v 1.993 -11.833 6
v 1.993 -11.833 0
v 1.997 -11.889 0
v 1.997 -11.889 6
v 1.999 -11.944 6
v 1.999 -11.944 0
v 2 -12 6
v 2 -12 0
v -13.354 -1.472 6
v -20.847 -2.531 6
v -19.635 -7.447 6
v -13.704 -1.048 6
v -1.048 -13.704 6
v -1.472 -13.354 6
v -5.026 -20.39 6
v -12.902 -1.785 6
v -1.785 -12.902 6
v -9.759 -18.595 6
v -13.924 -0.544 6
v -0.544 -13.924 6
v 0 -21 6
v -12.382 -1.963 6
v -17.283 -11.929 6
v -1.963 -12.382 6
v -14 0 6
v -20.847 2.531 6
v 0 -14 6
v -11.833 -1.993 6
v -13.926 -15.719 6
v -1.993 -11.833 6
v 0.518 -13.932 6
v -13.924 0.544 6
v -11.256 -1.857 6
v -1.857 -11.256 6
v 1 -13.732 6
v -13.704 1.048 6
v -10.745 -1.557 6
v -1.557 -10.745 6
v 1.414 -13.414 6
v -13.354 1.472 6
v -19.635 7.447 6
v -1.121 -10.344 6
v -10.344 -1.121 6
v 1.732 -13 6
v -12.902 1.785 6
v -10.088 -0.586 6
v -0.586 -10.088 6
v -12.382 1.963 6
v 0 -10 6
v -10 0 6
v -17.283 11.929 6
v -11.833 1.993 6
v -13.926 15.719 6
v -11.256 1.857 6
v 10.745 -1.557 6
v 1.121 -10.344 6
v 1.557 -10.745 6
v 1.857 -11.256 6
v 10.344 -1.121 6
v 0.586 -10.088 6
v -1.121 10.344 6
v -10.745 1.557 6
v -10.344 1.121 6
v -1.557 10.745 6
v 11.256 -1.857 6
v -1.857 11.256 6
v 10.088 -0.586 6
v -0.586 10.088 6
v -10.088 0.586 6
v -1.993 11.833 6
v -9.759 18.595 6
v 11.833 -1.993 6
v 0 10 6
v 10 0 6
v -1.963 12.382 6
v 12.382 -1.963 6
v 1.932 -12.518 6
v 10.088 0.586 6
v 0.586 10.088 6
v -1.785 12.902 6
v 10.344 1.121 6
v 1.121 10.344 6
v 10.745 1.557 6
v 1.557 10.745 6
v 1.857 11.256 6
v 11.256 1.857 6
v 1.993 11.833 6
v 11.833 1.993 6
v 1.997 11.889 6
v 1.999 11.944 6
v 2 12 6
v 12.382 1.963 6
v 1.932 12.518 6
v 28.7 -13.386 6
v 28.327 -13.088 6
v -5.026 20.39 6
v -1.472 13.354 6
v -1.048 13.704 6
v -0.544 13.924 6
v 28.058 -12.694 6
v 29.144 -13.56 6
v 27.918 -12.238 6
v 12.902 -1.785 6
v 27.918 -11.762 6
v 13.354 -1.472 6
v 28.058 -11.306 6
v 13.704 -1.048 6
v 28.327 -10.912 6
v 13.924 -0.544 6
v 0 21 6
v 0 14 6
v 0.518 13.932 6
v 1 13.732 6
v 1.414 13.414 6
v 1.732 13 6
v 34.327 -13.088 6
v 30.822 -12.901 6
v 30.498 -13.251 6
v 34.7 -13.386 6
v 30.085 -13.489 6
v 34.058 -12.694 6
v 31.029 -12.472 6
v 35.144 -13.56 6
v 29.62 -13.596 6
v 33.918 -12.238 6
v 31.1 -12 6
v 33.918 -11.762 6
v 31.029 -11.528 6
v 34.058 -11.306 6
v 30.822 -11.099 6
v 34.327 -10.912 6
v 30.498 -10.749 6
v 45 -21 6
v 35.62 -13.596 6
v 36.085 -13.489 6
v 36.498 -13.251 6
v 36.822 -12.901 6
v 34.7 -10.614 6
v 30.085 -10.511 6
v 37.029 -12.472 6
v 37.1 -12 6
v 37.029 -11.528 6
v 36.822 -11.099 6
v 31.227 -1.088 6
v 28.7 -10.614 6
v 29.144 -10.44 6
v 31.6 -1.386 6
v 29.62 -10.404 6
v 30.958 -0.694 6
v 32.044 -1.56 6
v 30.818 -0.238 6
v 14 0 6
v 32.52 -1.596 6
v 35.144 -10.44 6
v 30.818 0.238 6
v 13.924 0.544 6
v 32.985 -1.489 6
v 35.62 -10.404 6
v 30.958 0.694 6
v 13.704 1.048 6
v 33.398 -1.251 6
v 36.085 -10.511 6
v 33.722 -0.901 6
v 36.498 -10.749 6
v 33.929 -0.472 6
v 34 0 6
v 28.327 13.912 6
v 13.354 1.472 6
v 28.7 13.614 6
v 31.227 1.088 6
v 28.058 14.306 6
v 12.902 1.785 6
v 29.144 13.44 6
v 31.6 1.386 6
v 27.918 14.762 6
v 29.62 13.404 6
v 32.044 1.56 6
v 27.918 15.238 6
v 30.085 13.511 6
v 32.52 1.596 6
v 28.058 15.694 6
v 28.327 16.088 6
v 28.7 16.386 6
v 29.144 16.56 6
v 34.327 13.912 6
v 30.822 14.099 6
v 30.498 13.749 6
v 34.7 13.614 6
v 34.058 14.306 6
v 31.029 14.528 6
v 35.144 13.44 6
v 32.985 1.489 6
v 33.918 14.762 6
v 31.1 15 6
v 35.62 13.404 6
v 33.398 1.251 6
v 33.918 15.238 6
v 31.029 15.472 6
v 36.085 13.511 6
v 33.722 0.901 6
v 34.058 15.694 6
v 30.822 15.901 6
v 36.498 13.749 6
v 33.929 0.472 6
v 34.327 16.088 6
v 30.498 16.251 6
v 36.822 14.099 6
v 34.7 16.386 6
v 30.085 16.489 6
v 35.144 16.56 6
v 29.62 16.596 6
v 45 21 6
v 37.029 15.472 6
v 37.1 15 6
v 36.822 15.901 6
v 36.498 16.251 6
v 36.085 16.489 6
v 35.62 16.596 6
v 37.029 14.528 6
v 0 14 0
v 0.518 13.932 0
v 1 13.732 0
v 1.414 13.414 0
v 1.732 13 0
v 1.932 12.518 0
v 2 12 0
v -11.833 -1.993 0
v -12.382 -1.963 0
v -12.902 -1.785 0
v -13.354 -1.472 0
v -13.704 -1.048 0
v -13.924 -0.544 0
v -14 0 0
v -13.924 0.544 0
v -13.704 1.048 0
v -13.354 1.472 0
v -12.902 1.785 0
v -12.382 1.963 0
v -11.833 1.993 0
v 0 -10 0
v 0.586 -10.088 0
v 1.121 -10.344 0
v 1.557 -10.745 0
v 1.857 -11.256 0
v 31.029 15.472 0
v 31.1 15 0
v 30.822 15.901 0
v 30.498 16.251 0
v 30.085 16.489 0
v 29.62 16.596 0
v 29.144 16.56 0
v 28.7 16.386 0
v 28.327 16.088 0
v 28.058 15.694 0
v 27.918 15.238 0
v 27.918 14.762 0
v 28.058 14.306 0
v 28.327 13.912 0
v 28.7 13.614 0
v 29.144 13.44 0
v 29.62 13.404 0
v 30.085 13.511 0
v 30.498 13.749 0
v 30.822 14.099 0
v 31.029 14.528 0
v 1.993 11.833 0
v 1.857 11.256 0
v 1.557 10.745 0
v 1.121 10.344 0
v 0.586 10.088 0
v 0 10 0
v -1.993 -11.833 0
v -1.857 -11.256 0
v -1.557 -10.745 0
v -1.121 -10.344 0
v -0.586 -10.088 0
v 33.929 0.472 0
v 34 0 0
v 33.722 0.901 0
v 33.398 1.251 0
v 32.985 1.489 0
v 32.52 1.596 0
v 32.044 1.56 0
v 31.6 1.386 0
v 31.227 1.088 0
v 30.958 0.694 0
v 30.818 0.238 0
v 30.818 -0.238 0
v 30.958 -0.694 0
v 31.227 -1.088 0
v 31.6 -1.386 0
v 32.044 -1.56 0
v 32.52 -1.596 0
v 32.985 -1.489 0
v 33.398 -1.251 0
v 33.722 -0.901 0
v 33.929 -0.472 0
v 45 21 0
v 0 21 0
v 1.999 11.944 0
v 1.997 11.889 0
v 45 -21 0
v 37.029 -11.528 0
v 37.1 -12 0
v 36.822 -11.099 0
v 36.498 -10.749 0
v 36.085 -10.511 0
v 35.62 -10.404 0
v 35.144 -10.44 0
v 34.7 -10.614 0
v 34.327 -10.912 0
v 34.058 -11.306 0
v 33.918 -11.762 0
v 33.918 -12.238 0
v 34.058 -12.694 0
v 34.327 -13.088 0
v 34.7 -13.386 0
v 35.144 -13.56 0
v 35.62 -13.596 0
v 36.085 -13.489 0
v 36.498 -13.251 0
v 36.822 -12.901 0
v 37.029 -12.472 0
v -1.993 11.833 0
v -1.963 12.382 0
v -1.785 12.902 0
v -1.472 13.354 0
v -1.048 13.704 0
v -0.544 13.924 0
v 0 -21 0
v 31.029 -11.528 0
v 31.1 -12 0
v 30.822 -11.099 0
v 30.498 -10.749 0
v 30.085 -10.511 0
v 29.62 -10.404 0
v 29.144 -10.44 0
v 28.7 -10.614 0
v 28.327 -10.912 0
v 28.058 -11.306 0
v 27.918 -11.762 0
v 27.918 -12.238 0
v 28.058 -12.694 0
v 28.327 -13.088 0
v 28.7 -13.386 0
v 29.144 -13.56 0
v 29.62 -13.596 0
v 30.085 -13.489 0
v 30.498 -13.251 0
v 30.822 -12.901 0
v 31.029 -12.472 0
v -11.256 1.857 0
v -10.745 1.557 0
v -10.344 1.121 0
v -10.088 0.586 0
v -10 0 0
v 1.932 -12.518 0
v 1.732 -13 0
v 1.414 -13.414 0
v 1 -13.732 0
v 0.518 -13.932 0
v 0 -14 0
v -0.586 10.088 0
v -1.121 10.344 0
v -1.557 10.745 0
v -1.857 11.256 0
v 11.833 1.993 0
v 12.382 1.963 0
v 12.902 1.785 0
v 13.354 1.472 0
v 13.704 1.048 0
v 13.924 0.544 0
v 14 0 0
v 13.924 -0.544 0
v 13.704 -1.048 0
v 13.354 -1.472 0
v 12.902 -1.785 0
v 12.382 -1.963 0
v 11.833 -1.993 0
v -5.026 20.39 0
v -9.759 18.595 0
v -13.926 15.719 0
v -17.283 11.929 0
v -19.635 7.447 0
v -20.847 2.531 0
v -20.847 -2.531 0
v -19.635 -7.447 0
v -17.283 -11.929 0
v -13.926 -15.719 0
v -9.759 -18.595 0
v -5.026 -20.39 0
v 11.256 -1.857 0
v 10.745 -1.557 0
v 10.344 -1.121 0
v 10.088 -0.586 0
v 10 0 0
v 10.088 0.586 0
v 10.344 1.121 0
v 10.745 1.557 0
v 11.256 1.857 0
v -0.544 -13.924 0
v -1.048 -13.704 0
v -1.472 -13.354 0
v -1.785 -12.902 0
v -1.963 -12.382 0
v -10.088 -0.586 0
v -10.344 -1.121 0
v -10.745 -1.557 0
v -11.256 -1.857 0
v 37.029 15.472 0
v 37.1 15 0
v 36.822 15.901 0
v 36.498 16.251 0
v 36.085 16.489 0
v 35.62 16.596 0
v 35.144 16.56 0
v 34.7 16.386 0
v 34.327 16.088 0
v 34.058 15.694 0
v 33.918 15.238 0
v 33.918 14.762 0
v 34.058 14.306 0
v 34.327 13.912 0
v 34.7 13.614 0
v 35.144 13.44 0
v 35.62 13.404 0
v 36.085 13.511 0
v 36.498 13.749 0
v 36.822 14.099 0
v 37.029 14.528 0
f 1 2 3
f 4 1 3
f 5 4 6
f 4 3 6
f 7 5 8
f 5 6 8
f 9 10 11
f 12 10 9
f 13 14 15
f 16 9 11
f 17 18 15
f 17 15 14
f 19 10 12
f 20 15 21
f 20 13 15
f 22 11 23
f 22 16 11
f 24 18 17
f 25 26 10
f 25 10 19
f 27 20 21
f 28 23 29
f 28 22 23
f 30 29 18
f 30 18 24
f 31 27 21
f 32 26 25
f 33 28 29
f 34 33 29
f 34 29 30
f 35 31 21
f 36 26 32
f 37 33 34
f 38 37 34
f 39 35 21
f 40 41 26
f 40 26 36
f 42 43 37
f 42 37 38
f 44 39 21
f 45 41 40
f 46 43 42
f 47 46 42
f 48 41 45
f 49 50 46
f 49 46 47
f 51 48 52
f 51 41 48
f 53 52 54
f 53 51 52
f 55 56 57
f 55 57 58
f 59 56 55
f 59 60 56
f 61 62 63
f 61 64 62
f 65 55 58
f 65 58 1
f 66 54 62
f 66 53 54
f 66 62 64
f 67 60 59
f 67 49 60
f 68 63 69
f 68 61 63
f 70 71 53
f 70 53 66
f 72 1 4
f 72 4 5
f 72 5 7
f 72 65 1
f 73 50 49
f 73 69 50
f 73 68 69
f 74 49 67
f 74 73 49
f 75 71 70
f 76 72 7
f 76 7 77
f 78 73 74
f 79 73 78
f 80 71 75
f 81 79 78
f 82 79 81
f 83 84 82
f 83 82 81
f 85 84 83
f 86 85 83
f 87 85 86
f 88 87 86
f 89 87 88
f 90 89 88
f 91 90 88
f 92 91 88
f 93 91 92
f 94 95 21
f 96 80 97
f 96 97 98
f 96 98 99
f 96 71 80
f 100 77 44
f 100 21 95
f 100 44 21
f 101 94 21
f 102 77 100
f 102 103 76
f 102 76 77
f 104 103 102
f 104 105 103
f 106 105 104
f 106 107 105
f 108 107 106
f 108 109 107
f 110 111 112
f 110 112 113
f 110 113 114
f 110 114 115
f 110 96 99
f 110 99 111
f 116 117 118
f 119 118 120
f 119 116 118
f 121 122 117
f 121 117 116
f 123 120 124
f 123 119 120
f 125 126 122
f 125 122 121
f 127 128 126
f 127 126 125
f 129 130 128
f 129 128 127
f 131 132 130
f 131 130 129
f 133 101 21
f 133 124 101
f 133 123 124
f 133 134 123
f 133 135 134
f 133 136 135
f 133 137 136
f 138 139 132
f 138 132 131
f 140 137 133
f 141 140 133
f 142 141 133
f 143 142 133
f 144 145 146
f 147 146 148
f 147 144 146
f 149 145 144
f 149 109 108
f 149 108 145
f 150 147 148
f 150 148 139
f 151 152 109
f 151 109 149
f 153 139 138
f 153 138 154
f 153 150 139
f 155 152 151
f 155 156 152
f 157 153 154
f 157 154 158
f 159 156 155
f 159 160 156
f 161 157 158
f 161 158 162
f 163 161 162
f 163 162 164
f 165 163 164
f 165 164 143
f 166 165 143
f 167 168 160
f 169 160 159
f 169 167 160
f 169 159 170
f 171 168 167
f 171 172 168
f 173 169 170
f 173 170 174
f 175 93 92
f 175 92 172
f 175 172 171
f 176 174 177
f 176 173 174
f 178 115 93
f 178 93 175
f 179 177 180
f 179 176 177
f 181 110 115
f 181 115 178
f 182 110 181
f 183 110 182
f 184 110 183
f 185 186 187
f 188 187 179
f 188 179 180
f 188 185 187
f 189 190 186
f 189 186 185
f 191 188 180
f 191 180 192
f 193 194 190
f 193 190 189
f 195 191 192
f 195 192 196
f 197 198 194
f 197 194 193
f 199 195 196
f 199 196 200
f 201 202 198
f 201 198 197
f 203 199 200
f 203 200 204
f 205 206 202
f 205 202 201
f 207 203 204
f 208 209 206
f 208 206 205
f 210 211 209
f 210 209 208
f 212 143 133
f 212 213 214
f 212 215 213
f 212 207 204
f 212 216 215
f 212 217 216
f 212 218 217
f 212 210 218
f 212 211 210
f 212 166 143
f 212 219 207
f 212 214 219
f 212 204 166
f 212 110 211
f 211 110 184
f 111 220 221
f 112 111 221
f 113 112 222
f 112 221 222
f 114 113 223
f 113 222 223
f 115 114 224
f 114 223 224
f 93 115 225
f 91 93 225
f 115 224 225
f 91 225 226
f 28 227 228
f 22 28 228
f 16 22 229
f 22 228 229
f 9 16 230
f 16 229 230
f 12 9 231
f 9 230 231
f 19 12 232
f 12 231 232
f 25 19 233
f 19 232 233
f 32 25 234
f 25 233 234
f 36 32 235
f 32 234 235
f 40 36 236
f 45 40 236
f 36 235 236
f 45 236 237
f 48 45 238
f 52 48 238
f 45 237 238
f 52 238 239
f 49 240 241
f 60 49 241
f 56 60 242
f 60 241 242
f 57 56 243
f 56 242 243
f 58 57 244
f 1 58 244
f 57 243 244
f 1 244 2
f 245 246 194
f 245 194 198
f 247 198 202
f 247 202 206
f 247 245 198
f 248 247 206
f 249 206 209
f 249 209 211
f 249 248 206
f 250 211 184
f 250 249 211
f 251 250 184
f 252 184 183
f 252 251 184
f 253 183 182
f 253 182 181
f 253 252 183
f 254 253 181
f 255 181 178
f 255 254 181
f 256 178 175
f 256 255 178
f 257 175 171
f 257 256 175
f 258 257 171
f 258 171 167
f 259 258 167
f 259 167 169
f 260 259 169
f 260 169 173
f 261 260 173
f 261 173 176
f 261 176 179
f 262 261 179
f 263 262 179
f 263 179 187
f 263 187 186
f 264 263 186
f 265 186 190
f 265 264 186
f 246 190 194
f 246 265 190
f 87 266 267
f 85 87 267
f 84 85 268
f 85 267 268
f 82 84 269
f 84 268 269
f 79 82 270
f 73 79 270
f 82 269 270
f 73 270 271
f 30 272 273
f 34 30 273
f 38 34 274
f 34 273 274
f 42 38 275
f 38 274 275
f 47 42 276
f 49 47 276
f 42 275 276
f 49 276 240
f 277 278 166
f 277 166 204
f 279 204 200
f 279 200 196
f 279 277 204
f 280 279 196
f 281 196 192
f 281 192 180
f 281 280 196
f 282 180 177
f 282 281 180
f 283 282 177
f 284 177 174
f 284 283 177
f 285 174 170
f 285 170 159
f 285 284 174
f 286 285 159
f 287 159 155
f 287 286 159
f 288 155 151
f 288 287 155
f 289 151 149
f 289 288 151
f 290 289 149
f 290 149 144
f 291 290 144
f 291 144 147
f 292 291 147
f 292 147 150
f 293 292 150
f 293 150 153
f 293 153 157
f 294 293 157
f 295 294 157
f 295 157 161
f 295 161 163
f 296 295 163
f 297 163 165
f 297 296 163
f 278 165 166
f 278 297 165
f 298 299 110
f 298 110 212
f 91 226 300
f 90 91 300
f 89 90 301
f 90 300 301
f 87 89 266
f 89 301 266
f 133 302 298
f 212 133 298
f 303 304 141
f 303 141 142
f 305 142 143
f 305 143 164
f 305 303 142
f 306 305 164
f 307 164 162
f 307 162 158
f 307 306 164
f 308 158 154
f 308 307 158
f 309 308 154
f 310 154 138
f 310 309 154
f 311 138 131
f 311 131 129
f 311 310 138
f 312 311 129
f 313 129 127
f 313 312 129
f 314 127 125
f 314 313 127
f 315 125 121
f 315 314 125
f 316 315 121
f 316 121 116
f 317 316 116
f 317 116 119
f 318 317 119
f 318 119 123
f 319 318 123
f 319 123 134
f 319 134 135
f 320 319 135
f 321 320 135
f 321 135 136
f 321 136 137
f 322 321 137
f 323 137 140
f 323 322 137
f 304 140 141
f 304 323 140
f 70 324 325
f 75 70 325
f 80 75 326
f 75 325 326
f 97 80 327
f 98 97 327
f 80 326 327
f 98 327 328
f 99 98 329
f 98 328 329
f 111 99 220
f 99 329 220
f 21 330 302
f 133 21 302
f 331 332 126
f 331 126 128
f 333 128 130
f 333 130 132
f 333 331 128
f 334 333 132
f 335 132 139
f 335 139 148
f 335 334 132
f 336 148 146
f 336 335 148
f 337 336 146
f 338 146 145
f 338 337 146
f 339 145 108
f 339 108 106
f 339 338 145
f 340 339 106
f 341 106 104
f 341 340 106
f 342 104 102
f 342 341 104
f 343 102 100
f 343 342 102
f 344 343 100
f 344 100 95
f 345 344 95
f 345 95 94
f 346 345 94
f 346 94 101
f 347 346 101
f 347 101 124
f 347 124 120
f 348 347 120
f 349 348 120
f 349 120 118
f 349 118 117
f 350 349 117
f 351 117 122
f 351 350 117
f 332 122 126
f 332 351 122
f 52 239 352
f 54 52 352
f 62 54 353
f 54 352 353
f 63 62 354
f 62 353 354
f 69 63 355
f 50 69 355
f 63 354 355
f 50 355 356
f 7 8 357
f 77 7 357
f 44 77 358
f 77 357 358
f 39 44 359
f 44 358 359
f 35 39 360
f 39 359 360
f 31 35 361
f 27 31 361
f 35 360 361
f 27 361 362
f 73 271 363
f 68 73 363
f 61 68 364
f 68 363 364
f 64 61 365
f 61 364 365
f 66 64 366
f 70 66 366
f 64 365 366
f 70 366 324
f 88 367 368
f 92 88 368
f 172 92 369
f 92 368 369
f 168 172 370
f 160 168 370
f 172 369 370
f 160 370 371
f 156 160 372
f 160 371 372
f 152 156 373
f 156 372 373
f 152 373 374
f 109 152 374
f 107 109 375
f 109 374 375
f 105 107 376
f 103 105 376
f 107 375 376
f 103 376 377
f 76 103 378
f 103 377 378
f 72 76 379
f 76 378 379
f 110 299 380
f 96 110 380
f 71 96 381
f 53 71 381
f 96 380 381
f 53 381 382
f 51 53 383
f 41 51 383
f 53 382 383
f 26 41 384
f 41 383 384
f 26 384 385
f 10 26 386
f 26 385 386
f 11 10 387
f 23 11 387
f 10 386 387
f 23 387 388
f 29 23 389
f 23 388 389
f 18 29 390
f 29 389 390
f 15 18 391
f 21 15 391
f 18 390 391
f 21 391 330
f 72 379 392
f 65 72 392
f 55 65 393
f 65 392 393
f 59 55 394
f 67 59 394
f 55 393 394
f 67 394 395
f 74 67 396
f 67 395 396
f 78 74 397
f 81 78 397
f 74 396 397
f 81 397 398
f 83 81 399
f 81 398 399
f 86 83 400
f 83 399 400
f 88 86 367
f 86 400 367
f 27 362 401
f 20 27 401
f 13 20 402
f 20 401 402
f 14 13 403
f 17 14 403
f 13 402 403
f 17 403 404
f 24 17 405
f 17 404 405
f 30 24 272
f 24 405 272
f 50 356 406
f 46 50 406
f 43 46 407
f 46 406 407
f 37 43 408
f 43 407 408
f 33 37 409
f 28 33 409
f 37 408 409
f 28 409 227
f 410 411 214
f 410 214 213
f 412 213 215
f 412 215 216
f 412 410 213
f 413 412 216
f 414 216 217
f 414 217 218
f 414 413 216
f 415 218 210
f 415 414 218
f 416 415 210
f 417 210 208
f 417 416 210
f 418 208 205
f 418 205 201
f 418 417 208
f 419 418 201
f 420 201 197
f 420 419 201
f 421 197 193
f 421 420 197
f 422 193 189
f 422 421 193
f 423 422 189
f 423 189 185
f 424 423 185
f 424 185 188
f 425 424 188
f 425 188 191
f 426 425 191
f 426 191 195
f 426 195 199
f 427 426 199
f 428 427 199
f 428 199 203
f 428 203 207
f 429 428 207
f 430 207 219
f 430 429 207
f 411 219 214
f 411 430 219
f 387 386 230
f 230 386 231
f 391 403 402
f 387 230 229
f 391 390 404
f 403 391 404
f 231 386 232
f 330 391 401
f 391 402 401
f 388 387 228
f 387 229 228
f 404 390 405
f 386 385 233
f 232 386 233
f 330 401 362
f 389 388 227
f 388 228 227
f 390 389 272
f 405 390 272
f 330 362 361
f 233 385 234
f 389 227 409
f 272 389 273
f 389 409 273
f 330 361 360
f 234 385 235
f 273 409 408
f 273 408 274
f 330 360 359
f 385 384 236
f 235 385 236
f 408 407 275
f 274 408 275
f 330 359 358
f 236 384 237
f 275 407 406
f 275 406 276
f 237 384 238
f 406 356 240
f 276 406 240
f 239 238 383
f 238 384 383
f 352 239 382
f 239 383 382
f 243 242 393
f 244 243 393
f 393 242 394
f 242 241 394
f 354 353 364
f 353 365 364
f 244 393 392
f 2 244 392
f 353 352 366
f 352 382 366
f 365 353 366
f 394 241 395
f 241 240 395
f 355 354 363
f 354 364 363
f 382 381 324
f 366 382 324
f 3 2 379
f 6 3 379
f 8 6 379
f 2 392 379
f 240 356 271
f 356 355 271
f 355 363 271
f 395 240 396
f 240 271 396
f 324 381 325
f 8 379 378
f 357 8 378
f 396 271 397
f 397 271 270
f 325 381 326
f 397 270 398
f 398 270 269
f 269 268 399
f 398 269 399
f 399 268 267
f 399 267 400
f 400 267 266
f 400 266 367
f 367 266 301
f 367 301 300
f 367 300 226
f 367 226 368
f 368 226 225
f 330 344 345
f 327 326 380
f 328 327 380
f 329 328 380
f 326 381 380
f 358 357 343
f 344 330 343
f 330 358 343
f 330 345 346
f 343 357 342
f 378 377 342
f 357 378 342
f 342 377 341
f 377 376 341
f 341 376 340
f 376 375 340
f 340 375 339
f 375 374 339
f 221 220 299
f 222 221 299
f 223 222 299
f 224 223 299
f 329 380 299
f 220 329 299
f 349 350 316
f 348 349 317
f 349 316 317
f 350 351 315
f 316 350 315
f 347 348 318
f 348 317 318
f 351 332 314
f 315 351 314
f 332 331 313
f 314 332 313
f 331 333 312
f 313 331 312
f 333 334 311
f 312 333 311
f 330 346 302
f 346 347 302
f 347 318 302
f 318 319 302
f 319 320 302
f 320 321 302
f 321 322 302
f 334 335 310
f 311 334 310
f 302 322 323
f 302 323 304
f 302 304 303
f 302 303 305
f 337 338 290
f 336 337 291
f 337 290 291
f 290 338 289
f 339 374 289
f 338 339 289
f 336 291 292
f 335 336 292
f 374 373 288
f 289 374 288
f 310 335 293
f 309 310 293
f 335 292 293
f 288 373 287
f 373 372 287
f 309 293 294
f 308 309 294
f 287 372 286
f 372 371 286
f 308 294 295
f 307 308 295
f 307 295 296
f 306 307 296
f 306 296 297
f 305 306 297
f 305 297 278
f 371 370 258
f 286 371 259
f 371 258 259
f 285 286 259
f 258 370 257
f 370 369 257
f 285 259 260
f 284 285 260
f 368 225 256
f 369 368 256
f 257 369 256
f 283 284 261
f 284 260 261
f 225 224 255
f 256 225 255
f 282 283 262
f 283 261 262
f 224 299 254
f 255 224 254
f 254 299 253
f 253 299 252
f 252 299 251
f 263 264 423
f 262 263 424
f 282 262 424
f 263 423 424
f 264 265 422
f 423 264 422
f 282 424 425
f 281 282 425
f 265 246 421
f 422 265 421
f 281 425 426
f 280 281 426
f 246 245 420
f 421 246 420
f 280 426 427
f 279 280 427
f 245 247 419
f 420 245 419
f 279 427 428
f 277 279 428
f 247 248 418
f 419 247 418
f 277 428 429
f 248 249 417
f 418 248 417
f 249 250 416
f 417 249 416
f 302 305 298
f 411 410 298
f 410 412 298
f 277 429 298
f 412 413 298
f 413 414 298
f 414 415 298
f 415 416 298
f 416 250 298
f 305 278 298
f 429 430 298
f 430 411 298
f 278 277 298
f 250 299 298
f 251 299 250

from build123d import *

# Parameters (mm, degrees)
SKETCH_1_W      = 15
SKETCH_1_H      = 42
SKETCH_1_R      = 1.6
SKETCH_1_W_2    = 5
EXTRUDE_1_DEPTH = 6


with BuildPart() as part:
    # 草图1 → 凸台-拉伸1 (new body)
    # profile 1 of 7: a face of its own
    with BuildSketch(Plane.XY):
        with BuildLine():
            Line((0, 14), (0, 21))
            ThreePointArc((0, 21), (-21, 0), (0, -21))
            Line((0, -21), (0, -14))
            ThreePointArc((0, -14), (-1.471960144, -13.354006401), (-1.993043457, -11.833333333))
            ThreePointArc((-1.993043457, -11.833333333), (-8.485281374, -8.485281374), (-11.833333333, -1.993043457))
            ThreePointArc((-11.833333333, -1.993043457), (-14, 0), (-11.833333333, 1.993043457))
            ThreePointArc((-11.833333333, 1.993043457), (-8.485281374, 8.485281374), (-1.993043457, 11.833333333))
            ThreePointArc((-1.993043457, 11.833333333), (-1.471960144, 13.354006401), (0, 14))
        make_face()
    # profile 2 of 7: a face of its own
    with BuildSketch(Plane.XY):
        with BuildLine():
            ThreePointArc((0, 10), (-1.354006401, 10.528039856), (-1.993043457, 11.833333333))
            ThreePointArc((-1.993043457, 11.833333333), (-8.485281374, 8.485281374), (-11.833333333, 1.993043457))
            ThreePointArc((-11.833333333, 1.993043457), (-10.528039856, 1.354006401), (-10, 0))
            ThreePointArc((-10, 0), (-10.528039856, -1.354006401), (-11.833333333, -1.993043457))
            ThreePointArc((-11.833333333, -1.993043457), (-8.485281374, -8.485281374), (-1.993043457, -11.833333333))
            ThreePointArc((-1.993043457, -11.833333333), (-1.354006401, -10.528039856), (0, -10))
            Line((0, -10), (0, 10))
        make_face()
    # profile 3 of 7: a face of its own
    with BuildSketch(Plane.XY):
        with BuildLine():
            ThreePointArc((1.993043457, 11.833333333), (1.354006401, 10.528039856), (0, 10))
            Line((0, 10), (0, -10))
            ThreePointArc((0, -10), (1.354006401, -10.528039856), (1.993043457, -11.833333333))
            ThreePointArc((1.993043457, -11.833333333), (8.485281374, -8.485281374), (11.833333333, -1.993043457))
            ThreePointArc((11.833333333, -1.993043457), (10, 0), (11.833333333, 1.993043457))
            ThreePointArc((11.833333333, 1.993043457), (8.485281374, 8.485281374), (1.993043457, 11.833333333))
        make_face()
    # profile 4 of 7: a face of its own
    with BuildSketch(Plane.XY):
        with BuildLine():
            ThreePointArc((21, 0), (14.849242405, 14.849242405), (0, 21))
            Line((0, 21), (0, 14))
            ThreePointArc((0, 14), (1.414213562, 13.414213562), (2, 12))
            ThreePointArc((2, 12), (1.998260107, 11.916594108), (1.993043457, 11.833333333))
            ThreePointArc((1.993043457, 11.833333333), (8.485281374, 8.485281374), (11.833333333, 1.993043457))
            ThreePointArc((11.833333333, 1.993043457), (13.354006401, 1.471960144), (14, 0))
            ThreePointArc((14, 0), (13.354006401, -1.471960144), (11.833333333, -1.993043457))
            ThreePointArc((11.833333333, -1.993043457), (8.485281374, -8.485281374), (1.993043457, -11.833333333))
            ThreePointArc((1.993043457, -11.833333333), (1.998260107, -11.916594108), (2, -12))
            ThreePointArc((2, -12), (1.414213562, -13.414213562), (0, -14))
            Line((0, -14), (0, -21))
            ThreePointArc((0, -21), (14.849242405, -14.849242405), (21, 0))
        make_face()
    # profile 5 of 7: a face of its own
    with BuildSketch(Plane.XY):
        with BuildLine():
            Line((25, 21), (0, 21))
            ThreePointArc((0, 21), (14.849242405, 14.849242405), (21, 0))
            ThreePointArc((21, 0), (14.849242405, -14.849242405), (0, -21))
            Line((0, -21), (25, -21))
            Line((25, -21), (25, 21))
        make_face()
    # profile 6 of 7: a face of its own
    with BuildSketch(Plane.XY):
        with Locations((32.5, 0)):
            Rectangle(SKETCH_1_W, SKETCH_1_H)
        with Locations((32.4, 0)):
            Circle(SKETCH_1_R, mode=Mode.SUBTRACT)
        with Locations((29.5, -12)):
            Circle(SKETCH_1_R, mode=Mode.SUBTRACT)
        with Locations((35.5, -12)):
            Circle(SKETCH_1_R, mode=Mode.SUBTRACT)
        with Locations((35.5, 15)):
            Circle(SKETCH_1_R, mode=Mode.SUBTRACT)
        with Locations((29.5, 15)):
            Circle(SKETCH_1_R, mode=Mode.SUBTRACT)
    # profile 7 of 7: a face of its own
    with BuildSketch(Plane.XY):
        with Locations((42.5, 0)):
            Rectangle(SKETCH_1_W_2, SKETCH_1_H)
    extrude(amount=EXTRUDE_1_DEPTH)


solid = part.part
